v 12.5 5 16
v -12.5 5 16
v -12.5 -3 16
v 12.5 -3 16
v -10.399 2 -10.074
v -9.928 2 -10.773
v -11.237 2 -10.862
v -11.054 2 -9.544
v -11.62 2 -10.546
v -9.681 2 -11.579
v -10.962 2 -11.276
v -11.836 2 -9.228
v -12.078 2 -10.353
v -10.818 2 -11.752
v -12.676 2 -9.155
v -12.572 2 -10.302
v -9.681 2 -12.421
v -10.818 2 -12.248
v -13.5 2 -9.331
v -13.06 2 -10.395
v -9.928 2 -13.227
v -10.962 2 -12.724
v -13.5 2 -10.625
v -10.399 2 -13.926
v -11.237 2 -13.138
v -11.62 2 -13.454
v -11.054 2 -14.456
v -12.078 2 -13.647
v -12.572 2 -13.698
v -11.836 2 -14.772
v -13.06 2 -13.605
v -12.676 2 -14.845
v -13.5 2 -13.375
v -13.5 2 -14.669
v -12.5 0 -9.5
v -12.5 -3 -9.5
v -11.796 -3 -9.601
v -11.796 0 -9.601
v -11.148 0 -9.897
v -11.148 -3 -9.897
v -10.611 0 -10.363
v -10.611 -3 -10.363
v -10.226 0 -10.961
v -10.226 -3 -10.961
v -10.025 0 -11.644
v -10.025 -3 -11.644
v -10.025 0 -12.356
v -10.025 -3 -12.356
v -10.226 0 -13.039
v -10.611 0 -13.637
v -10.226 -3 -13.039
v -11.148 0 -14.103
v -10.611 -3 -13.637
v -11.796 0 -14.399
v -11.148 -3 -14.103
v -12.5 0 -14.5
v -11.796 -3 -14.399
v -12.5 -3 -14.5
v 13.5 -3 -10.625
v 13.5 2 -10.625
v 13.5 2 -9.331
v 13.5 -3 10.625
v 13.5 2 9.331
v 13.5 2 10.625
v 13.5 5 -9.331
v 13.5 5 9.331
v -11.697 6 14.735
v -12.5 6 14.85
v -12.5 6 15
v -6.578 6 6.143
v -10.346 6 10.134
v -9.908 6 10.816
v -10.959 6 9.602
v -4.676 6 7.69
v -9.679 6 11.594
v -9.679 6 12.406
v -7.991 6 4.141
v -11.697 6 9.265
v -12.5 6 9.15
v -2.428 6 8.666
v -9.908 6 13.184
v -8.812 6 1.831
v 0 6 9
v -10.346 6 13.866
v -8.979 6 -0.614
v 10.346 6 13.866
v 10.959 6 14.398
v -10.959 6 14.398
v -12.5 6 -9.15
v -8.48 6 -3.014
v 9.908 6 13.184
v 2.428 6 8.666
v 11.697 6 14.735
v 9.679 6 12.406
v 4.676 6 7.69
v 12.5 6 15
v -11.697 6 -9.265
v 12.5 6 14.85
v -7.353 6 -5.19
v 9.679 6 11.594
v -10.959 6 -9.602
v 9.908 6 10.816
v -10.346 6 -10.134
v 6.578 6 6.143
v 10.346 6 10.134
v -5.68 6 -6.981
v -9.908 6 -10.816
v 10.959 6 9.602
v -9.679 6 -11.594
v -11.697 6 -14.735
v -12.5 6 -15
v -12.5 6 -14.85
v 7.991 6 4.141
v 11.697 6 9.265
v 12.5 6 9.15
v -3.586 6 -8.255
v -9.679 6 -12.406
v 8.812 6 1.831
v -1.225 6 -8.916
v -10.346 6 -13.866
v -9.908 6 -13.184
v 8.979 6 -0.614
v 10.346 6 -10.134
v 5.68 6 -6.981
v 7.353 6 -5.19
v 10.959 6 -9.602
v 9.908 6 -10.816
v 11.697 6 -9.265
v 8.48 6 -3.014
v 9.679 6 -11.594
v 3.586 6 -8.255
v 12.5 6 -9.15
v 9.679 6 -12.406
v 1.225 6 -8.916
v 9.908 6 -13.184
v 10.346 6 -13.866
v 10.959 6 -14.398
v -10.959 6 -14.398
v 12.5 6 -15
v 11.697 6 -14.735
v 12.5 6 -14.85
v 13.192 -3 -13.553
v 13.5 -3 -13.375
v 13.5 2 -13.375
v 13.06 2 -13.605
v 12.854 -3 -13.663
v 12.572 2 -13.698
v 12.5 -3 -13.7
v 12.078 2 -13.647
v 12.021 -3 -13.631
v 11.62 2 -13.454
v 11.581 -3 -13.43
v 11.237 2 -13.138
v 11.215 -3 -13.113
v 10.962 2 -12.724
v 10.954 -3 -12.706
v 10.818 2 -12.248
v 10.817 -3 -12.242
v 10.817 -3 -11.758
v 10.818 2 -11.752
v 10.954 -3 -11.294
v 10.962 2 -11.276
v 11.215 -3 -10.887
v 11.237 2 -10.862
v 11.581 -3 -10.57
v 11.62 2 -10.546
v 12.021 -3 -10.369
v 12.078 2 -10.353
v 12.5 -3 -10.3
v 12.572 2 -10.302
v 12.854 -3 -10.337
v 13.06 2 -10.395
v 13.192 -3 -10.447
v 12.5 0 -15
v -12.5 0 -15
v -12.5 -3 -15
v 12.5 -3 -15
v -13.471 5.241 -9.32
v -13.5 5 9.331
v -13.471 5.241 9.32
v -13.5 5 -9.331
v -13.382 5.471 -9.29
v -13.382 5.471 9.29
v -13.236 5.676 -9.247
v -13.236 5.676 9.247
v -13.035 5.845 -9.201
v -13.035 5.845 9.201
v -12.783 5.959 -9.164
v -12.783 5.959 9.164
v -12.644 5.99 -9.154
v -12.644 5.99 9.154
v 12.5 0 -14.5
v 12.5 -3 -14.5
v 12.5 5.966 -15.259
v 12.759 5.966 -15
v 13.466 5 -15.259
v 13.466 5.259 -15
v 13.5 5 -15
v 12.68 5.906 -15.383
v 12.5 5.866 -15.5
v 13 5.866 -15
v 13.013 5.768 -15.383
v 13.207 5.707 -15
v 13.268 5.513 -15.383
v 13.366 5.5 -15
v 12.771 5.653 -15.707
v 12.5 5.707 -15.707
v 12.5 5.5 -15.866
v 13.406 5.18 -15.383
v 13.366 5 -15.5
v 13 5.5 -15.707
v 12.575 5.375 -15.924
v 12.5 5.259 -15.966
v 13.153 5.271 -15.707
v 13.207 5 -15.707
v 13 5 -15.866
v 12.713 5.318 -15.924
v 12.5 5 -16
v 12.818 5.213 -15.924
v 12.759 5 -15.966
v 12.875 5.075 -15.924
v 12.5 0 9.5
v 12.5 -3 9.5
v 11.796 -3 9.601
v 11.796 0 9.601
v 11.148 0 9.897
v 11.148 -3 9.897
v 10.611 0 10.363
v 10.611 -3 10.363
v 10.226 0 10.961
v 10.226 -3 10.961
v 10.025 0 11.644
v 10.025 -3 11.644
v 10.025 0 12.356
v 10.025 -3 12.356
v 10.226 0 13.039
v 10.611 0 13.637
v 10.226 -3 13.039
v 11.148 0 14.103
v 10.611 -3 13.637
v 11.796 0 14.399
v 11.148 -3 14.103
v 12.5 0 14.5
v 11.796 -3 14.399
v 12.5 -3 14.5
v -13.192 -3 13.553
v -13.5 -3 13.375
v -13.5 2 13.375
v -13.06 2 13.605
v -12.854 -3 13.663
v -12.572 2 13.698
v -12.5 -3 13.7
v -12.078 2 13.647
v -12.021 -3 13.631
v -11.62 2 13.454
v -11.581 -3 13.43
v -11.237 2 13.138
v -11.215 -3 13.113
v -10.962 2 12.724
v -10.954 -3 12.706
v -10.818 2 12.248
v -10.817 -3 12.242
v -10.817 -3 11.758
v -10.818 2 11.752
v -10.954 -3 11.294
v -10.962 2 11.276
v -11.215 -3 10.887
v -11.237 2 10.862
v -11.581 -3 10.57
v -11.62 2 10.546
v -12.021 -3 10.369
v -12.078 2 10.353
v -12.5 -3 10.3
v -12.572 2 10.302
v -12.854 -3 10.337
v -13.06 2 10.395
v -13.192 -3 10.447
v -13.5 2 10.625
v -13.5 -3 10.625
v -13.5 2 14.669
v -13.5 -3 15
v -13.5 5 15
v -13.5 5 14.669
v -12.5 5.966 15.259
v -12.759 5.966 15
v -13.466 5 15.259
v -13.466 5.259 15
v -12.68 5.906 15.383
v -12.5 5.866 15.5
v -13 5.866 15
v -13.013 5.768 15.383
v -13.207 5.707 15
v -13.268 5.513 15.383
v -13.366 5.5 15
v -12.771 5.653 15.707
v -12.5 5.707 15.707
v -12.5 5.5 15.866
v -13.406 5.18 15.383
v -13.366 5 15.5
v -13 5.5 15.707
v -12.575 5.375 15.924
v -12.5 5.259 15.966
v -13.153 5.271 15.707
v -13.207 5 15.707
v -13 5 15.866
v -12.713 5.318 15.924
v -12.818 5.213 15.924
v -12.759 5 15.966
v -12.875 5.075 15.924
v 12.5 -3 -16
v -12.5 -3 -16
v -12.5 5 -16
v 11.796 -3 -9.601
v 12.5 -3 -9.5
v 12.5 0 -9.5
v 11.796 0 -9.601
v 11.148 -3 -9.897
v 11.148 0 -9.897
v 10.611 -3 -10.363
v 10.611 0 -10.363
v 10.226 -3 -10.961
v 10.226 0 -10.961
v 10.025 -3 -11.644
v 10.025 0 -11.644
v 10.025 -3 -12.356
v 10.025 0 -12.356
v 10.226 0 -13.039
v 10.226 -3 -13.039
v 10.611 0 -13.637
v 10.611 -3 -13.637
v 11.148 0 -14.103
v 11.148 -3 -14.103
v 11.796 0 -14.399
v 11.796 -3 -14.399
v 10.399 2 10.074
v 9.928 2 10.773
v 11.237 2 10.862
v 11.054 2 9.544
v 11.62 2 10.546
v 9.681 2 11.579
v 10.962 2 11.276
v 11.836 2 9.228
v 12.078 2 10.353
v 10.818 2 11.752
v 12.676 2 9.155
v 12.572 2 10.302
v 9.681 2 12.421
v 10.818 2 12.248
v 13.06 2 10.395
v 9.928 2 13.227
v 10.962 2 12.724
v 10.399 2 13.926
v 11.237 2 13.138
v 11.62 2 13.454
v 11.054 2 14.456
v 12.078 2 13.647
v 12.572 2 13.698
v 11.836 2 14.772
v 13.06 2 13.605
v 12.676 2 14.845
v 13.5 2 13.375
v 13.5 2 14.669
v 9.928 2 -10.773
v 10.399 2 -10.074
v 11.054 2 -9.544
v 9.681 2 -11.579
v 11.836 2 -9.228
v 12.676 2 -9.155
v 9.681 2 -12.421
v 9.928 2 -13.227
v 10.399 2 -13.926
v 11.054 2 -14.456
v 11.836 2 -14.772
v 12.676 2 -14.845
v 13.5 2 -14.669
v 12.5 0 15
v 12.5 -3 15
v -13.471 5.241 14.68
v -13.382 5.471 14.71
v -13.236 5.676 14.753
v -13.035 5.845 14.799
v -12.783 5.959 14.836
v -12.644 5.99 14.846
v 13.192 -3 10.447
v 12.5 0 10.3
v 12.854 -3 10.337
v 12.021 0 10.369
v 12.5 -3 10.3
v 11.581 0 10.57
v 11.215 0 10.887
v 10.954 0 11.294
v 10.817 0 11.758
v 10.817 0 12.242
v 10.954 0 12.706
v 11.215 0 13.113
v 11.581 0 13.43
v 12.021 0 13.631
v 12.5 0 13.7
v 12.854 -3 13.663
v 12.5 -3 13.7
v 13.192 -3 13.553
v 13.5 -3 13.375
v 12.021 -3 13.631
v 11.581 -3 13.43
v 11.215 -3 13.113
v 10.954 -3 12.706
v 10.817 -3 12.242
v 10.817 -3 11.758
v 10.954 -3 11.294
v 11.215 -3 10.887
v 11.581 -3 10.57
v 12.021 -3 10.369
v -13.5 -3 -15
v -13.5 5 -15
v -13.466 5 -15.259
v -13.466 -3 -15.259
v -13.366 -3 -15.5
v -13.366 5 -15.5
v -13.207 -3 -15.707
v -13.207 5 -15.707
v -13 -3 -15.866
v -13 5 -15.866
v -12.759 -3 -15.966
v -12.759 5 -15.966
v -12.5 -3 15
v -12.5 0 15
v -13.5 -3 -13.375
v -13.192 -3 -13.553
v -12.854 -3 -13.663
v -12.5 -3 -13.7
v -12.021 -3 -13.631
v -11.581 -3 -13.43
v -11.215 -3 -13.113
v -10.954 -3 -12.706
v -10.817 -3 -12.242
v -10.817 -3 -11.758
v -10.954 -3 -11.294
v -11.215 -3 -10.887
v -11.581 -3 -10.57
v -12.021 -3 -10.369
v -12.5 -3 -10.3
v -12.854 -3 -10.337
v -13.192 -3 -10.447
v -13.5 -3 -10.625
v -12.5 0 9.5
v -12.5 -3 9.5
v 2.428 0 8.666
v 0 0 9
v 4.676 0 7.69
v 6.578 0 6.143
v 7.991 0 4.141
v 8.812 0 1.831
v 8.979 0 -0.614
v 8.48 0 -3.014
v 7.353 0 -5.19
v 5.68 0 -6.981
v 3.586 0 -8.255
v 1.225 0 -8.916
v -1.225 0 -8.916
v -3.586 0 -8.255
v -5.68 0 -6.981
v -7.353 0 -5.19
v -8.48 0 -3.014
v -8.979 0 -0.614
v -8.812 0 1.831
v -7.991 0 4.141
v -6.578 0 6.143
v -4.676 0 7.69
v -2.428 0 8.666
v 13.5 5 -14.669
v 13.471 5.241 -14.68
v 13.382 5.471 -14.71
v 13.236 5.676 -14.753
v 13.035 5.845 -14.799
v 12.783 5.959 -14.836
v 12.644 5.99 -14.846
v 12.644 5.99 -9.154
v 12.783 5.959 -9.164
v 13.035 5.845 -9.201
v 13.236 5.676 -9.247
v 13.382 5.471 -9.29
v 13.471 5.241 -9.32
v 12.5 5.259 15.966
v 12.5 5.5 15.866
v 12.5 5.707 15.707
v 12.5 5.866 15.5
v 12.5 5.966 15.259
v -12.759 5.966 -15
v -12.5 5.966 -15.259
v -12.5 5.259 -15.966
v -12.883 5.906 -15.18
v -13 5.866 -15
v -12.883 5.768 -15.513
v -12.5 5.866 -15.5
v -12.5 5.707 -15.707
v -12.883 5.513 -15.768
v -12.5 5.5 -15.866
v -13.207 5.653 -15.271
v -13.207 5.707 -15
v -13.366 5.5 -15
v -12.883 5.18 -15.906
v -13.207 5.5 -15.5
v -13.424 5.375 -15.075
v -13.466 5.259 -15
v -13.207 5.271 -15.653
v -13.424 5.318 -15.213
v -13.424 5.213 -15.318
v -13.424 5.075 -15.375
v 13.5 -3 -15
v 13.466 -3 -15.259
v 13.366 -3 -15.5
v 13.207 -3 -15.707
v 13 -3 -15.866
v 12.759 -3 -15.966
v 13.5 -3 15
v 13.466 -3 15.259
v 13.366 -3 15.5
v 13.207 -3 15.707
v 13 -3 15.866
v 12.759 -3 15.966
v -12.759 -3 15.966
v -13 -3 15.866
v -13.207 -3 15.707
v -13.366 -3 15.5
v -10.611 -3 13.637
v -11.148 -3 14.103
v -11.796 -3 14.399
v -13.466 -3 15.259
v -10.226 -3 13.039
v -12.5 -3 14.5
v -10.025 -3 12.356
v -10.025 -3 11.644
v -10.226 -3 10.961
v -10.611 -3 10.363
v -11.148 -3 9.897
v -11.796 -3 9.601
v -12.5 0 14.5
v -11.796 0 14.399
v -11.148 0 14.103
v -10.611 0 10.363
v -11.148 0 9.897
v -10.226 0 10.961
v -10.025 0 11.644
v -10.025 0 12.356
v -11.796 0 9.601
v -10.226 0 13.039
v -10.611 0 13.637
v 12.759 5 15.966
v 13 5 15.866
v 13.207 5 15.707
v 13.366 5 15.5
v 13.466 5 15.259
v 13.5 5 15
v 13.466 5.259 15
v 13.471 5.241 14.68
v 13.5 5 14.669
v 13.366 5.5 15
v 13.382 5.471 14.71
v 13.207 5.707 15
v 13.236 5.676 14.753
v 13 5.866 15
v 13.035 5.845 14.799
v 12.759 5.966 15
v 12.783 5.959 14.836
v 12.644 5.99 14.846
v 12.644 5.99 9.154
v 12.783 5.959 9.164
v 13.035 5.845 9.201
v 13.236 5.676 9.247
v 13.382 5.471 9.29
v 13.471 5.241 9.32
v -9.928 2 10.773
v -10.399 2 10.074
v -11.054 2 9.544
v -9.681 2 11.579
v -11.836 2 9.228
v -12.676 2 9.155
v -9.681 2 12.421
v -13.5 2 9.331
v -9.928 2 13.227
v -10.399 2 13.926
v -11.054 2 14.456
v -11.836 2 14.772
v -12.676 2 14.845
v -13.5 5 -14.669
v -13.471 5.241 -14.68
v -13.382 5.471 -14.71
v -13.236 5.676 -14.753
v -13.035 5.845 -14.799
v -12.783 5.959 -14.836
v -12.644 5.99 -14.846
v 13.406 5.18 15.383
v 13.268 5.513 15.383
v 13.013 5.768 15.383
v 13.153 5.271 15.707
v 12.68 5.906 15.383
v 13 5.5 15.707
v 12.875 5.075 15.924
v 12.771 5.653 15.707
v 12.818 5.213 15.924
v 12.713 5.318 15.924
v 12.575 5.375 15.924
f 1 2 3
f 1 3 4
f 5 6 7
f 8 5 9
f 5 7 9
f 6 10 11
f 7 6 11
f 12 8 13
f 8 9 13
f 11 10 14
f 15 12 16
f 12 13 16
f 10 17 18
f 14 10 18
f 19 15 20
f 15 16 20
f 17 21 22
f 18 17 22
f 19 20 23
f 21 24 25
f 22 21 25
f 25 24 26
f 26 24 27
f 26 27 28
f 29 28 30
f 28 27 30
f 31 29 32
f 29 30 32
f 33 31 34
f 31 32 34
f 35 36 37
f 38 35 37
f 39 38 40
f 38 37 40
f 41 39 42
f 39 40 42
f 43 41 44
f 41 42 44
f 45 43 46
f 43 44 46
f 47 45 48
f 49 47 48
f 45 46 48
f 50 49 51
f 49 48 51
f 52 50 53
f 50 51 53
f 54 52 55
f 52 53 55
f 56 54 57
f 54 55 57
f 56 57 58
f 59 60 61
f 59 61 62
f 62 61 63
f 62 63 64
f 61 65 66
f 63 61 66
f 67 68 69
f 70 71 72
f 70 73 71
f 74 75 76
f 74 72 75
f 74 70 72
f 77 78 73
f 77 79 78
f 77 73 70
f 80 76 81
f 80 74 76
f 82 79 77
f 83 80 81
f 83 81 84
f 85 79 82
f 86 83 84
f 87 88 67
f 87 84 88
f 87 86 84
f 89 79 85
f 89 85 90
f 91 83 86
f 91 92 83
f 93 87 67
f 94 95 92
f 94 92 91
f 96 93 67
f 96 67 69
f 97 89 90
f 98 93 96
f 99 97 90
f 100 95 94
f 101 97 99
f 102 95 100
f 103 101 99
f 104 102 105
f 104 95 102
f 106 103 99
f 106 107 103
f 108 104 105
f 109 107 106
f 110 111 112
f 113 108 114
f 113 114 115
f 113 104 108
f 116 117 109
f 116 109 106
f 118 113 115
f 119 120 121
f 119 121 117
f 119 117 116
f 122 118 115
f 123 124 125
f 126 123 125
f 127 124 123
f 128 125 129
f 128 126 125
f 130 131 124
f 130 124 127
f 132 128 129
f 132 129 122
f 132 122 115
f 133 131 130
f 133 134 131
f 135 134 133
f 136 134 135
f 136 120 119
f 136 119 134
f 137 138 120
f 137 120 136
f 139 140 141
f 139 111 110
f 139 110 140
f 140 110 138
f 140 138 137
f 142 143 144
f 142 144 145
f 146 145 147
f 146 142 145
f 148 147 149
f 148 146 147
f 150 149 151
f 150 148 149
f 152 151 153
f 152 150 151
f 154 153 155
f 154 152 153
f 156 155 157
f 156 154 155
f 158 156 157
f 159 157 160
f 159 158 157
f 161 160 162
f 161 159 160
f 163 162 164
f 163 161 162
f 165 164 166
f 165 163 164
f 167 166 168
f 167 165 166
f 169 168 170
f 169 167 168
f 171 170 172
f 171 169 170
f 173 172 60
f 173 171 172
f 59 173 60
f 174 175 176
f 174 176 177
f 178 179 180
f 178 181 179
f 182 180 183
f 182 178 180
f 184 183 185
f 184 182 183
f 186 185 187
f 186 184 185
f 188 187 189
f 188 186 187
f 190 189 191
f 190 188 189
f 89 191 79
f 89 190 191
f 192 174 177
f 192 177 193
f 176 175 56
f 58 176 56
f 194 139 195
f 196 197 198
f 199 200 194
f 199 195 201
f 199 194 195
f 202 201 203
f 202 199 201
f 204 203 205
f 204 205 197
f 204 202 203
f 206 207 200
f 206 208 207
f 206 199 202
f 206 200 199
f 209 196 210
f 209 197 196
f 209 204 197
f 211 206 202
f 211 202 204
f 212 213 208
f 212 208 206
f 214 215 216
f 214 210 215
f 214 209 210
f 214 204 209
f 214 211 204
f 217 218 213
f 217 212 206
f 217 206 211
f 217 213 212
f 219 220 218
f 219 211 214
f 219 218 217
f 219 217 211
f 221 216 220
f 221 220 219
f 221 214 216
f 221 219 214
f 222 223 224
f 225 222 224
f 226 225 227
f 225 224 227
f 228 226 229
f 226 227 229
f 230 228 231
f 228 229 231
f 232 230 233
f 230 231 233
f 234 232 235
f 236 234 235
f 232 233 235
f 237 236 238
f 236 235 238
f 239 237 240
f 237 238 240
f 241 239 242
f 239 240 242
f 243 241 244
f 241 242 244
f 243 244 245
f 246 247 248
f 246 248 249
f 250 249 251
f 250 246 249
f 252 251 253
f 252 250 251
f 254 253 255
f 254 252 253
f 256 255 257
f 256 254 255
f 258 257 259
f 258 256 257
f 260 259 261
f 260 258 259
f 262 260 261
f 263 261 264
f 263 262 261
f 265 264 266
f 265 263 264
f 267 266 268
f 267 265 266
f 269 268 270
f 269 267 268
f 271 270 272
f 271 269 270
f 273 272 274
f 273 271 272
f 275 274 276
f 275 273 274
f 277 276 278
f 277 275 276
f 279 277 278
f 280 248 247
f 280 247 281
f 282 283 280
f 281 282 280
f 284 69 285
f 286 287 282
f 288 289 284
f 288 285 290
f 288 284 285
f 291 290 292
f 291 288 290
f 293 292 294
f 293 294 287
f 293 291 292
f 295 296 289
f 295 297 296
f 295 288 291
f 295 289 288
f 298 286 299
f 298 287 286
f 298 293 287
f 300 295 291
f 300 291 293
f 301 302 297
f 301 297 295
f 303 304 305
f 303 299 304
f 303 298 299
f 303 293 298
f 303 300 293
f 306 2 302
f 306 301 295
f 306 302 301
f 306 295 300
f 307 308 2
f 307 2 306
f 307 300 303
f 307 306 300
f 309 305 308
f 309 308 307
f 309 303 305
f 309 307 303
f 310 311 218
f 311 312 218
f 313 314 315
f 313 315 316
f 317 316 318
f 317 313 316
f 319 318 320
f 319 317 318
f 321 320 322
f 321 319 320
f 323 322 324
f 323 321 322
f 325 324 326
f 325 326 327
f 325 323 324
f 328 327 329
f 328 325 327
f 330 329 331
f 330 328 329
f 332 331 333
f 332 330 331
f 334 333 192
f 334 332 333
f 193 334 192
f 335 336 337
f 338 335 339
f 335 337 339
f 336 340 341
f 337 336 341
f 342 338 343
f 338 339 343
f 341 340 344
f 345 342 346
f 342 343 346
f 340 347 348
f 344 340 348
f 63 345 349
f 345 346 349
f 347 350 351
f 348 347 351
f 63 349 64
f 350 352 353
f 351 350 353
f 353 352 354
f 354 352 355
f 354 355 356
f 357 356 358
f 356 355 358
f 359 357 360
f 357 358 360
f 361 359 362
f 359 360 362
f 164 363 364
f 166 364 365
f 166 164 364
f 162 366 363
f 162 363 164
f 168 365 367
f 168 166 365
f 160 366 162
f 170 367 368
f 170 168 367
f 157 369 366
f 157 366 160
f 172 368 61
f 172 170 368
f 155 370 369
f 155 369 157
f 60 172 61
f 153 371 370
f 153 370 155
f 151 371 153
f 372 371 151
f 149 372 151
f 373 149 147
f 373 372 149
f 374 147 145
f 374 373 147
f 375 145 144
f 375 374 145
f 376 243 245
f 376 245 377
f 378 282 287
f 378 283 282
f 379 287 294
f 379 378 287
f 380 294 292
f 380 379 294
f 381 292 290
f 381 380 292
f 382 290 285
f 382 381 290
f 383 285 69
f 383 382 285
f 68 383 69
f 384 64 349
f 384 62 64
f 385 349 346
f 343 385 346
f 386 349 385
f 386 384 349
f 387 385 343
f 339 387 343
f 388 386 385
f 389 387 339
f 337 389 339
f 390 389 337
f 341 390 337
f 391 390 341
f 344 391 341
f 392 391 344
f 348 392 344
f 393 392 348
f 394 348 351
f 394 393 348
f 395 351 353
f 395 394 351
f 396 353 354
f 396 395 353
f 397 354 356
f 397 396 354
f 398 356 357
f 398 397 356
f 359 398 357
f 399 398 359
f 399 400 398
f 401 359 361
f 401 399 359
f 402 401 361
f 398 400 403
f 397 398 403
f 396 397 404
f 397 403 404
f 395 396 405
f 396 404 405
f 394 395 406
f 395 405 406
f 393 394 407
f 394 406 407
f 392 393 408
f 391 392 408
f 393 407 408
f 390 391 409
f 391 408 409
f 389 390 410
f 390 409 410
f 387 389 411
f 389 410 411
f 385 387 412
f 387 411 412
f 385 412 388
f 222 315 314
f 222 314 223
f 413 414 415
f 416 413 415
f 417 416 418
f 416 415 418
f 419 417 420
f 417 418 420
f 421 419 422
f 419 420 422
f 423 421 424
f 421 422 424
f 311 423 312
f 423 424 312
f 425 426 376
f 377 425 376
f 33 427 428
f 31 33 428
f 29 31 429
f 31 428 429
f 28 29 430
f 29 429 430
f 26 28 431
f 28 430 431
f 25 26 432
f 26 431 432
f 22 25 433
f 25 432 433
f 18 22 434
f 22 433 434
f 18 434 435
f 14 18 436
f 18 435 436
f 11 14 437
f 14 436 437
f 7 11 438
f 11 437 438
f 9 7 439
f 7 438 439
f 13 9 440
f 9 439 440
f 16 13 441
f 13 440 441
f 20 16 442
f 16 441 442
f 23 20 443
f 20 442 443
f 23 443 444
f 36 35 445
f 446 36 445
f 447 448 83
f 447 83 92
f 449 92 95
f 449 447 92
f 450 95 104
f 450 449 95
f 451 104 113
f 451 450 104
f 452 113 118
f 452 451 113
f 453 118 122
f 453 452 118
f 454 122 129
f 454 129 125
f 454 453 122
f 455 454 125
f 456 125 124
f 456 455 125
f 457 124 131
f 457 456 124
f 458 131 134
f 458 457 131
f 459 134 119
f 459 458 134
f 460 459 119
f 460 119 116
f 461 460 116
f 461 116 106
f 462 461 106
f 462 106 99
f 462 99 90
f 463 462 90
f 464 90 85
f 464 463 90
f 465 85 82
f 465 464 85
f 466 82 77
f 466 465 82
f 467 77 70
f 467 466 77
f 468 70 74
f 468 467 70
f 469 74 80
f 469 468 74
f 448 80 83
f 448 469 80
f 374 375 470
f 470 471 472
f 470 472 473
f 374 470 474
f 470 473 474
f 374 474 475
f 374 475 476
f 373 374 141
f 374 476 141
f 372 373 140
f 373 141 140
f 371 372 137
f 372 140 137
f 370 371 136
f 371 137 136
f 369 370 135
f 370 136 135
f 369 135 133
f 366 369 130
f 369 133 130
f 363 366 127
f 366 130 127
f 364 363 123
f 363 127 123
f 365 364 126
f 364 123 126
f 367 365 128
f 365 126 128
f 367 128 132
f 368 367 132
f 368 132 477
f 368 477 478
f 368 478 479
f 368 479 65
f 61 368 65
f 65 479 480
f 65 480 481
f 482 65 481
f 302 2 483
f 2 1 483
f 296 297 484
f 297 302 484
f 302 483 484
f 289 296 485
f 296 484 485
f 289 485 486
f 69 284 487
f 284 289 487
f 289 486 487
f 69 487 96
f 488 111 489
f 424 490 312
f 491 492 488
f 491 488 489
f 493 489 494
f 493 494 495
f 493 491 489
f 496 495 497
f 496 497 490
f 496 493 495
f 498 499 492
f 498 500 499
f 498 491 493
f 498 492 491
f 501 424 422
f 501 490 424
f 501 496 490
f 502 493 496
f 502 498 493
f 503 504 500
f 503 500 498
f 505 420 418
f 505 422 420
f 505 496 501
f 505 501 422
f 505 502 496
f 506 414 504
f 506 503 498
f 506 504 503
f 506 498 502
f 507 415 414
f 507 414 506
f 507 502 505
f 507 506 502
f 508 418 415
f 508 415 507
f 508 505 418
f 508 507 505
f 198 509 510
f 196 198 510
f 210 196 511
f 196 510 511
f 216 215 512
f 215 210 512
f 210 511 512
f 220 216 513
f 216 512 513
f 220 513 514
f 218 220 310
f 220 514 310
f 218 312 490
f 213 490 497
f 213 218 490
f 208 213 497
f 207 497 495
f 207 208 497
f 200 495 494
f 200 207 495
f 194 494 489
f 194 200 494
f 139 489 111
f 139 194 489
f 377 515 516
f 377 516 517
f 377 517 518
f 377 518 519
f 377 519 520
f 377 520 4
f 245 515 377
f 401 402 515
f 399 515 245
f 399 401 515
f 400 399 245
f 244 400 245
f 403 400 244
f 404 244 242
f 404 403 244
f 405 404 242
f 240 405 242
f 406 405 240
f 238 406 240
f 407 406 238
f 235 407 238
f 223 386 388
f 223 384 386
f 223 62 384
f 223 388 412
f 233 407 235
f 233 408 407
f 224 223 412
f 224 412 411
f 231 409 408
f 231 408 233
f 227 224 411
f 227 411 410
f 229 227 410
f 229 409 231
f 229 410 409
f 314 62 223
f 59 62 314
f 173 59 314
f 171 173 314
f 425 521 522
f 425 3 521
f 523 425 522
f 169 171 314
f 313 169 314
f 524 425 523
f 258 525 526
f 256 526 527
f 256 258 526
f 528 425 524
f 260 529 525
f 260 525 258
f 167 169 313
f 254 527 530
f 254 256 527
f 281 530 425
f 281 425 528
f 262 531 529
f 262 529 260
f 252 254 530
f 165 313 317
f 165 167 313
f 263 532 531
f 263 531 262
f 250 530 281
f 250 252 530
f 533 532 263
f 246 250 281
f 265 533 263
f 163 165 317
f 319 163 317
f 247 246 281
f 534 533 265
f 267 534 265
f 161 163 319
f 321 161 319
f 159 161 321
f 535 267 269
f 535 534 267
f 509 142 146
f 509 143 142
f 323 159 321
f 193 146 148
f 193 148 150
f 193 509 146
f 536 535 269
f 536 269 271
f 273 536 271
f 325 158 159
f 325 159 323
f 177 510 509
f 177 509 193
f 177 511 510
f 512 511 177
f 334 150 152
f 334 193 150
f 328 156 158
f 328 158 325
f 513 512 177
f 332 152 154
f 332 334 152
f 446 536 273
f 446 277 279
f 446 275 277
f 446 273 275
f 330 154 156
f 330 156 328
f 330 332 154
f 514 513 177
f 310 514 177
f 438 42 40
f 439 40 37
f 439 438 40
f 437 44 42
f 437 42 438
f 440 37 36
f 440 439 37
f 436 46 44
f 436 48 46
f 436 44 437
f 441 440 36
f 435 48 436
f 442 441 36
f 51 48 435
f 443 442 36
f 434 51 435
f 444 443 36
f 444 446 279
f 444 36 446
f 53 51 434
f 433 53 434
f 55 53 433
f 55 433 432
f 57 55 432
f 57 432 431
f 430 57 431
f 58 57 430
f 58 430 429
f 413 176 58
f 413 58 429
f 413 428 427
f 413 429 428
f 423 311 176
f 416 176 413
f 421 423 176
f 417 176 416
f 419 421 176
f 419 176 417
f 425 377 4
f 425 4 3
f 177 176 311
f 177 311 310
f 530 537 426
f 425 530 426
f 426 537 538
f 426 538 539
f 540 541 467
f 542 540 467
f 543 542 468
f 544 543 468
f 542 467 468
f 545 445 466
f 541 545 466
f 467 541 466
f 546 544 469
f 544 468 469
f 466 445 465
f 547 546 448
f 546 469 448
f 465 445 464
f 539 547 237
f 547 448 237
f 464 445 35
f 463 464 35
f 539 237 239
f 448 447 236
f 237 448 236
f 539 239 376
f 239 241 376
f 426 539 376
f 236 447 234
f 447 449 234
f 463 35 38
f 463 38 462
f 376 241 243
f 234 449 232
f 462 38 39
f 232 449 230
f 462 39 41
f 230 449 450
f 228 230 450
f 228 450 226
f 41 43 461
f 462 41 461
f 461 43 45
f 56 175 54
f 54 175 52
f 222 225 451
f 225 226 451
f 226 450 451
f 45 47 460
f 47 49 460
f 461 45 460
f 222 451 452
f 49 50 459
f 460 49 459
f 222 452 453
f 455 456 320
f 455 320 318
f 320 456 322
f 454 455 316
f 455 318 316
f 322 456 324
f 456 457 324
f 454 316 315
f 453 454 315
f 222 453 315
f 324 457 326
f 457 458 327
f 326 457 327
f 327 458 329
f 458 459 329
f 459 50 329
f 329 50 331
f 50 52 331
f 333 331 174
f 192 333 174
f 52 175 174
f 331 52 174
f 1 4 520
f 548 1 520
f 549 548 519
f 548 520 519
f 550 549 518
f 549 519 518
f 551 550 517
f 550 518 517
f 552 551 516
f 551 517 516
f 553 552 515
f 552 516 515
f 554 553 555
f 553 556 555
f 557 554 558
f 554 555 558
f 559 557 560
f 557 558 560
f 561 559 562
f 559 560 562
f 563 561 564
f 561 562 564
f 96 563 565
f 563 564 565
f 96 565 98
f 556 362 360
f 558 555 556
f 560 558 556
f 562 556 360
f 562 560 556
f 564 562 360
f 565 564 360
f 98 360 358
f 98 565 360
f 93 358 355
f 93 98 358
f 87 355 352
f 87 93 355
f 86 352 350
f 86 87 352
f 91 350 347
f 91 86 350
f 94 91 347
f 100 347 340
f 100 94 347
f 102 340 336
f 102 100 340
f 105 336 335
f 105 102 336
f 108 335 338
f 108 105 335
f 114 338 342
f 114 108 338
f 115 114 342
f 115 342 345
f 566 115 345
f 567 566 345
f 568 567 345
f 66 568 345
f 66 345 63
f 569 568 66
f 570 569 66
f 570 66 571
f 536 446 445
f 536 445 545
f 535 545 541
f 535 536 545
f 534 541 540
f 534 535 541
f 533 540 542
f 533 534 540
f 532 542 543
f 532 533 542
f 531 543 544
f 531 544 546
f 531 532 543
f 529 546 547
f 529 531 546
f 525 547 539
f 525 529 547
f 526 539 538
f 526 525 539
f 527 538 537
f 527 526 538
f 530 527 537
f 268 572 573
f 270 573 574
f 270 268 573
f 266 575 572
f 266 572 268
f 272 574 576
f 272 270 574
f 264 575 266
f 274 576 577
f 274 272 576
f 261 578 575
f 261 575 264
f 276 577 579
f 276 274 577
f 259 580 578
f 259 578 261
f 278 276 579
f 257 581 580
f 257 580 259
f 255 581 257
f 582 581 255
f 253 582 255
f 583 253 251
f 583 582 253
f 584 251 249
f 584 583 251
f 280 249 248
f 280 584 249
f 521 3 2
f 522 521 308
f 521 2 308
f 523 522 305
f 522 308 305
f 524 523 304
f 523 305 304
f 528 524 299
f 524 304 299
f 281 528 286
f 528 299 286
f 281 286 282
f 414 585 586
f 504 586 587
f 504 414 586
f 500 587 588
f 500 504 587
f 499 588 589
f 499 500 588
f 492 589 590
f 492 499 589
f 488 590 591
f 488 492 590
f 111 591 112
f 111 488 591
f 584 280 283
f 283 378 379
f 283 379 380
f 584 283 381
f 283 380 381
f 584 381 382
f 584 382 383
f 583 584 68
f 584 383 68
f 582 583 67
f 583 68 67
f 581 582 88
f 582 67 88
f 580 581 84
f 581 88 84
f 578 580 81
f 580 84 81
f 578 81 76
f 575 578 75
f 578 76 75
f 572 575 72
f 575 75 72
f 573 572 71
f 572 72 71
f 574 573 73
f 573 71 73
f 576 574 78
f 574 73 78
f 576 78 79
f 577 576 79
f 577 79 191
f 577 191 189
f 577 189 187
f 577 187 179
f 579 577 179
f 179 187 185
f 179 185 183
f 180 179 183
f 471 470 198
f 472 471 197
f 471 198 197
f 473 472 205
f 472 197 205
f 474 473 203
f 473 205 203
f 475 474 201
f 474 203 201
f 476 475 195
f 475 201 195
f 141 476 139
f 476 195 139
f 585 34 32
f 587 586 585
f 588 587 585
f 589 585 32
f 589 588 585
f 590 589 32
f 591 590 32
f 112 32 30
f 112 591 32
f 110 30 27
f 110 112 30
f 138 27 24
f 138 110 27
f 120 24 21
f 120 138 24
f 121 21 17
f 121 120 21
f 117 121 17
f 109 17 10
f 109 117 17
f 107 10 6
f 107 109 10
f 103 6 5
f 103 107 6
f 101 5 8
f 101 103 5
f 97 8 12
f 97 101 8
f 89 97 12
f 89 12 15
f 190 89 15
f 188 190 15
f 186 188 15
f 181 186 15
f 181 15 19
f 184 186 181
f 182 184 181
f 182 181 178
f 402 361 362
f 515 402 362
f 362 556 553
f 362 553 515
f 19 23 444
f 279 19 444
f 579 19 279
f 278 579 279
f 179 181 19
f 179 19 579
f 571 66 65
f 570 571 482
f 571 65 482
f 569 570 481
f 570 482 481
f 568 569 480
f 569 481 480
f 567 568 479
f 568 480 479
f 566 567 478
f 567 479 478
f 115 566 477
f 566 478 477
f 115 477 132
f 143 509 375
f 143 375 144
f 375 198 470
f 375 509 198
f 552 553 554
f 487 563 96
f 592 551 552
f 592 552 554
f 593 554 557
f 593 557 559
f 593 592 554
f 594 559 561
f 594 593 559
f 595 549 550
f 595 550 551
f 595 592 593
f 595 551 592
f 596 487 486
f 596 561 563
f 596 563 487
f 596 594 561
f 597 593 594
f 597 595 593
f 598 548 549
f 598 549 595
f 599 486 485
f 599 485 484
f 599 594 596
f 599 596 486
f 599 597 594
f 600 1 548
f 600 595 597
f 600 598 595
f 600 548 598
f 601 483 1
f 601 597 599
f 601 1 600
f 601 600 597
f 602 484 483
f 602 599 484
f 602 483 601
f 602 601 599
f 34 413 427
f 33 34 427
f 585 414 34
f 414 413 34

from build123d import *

# Parameters (mm, degrees)
SKETCH2_W               = 27
SKETCH2_H               = 32
SKETCH2_R               = 9
BOSS_EXTRUDE1_DEPTH     = 6
SKETCH3_W               = 27
SKETCH3_H               = 32
SKETCH3_W_2             = 25
SKETCH3_H_2             = 30
BOSS_EXTRUDE2_DEPTH     = 3
CUT_EXTRUDE1_DEPTH      = 22.77728174
CUT_EXTRUDE1_DEPTH_BACK = 22.77728174
SKETCH1_R               = 1.7
BOSS_EXTRUDE4_REACH     = 24.787
MIRROR2_COPY_1_REACH    = 24.787
SKETCH6_R               = 2.85
CUT_EXTRUDE2_DEPTH      = 4
MIRROR4_COPY_1_SKETCH_R = 2.85
MIRROR4_COPY_1_DEPTH    = 4
FILLET1_R               = 1
FILLET4_R               = 1


with BuildPart() as part:
    # Sketch2 → Boss-Extrude1 (new body)
    with BuildSketch(Plane(origin=(0, 0, 0), x_dir=(1, 0, 0), z_dir=(0, 1, 0))):
        Rectangle(SKETCH2_W, SKETCH2_H)
        with Locations(Location((0, 0, 0), (0, 0, 270))):
            Circle(SKETCH2_R, mode=Mode.SUBTRACT)
    extrude(amount=BOSS_EXTRUDE1_DEPTH)

    # Sketch3 → Boss-Extrude2 (add)
    with BuildSketch(Plane.XZ):
        Rectangle(SKETCH3_W, SKETCH3_H)
        Rectangle(SKETCH3_W_2, SKETCH3_H_2, mode=Mode.SUBTRACT)
    extrude(amount=BOSS_EXTRUDE2_DEPTH)

    # Sketch1 → Cut-Extrude1 (cut, two sides: drawn at the far end of the back side and taken through both)
    with BuildSketch(Plane(origin=(0, 0, 0), x_dir=(1, 0, 0), z_dir=(0, 1, 0)).offset(-CUT_EXTRUDE1_DEPTH_BACK)):
        with Locations((-12.5, 12)):
            Circle(SKETCH1_R)
        with Locations((12.5, 12)):
            Circle(SKETCH1_R)
        with Locations((-12.5, -12)):
            Circle(SKETCH1_R)
        with Locations((12.5, -12)):
            Circle(SKETCH1_R)
    extrude(amount=CUT_EXTRUDE1_DEPTH + CUT_EXTRUDE1_DEPTH_BACK, mode=Mode.SUBTRACT)

    # Sketch5 → Boss-Extrude4 (add, up to next)
    with BuildSketch(Plane.XZ.offset(3), mode=Mode.PRIVATE) as boss_extrude4_sk1:
        with BuildLine():
            Line((13.5, -10.625227292), (13.5, -9.708712153))
            ThreePointArc((13.5, -9.708712153), (10, -12), (13.5, -14.291287847))
            Line((13.5, -14.291287847), (13.5, -13.374772708))
            ThreePointArc((13.5, -13.374772708), (10.8, -12), (13.5, -10.625227292))
        make_face()
    boss_extrude4_tool1 = extrude(boss_extrude4_sk1.sketch, amount=-BOSS_EXTRUDE4_REACH, mode=Mode.PRIVATE) - part.part
    boss_extrude4 = boss_extrude4_tool1.solids().sort_by_distance((13.438967, -3, -10.16697))[0]
    add(boss_extrude4)

    # Mirror1: Boss-Extrude4 across plane
    add(boss_extrude4.mirror(Plane(origin=(0, 0, 0), x_dir=(0, 0, 1), z_dir=(1, 0, 0))))

    # Mirror2: Boss-Extrude4 across plane
    add(boss_extrude4.mirror(Plane.XY))

    # Mirror2 copy 1 sketch → Mirror2 copy 1 (add, up to next)
    with BuildSketch(Plane(origin=(0, -3, 0), x_dir=(-1, 0, 0), z_dir=(0, -1, 0)), mode=Mode.PRIVATE) as mirror2_copy_1_sk1:
        with BuildLine():
            Line((13.5, -10.625227292), (13.5, -9.708712153))
            ThreePointArc((13.5, -9.708712153), (10, -12), (13.5, -14.291287847))
            Line((13.5, -14.291287847), (13.5, -13.374772708))
            ThreePointArc((13.5, -13.374772708), (10.8, -12), (13.5, -10.625227292))
        make_face()
    mirror2_copy_1_tool1 = extrude(mirror2_copy_1_sk1.sketch, amount=-MIRROR2_COPY_1_REACH, mode=Mode.PRIVATE) - part.part
    add(mirror2_copy_1_tool1.solids().sort_by_distance((-13.438967, -3, 10.16697))[0])

    # Sketch6 → Cut-Extrude2 (cut)
    with BuildSketch(Plane(origin=(0, 6, 0), x_dir=(1, 0, 0), z_dir=(0, 1, 0))):
        with Locations((12.5, 12)):
            Circle(SKETCH6_R)
    cut_extrude2 = extrude(amount=-CUT_EXTRUDE2_DEPTH, mode=Mode.SUBTRACT)

    # Mirror3: Cut-Extrude2 across plane
    add(cut_extrude2.mirror(Plane(origin=(0, 0, 0), x_dir=(0, 0, 1), z_dir=(1, 0, 0))), mode=Mode.SUBTRACT)

    # Mirror4: Cut-Extrude2 across plane
    add(cut_extrude2.mirror(Plane.XY), mode=Mode.SUBTRACT)

    # Mirror4 copy 1 sketch → Mirror4 copy 1 (cut)
    with BuildSketch(Plane(origin=(0, 6, 0), x_dir=(-1, 0, 0), z_dir=(0, 1, 0))):
        with Locations((12.5, 12)):
            Circle(MIRROR4_COPY_1_SKETCH_R)
    extrude(amount=-MIRROR4_COPY_1_DEPTH, mode=Mode.SUBTRACT)

    # Fillet1
    fillet1_edges = [part.edges().sort_by_distance(p)[0] for p in [
        (-13.5, 6, -15.334400615),
        (13.5, 6, -15.334400615),
        (0, 6, 16),
        (-13.5, 6, 0),
        (13.5, 6, 0),
        (-13.5, 6, 15.334400615),
        (13.5, 6, 15.334400615),
        (0, 6, -16),
    ]]
    fillet(fillet1_edges, radius=FILLET1_R)

    # Fillet4
    # the kernel refuses this fillet: 1 mm, written as the material it takes off along each edge
    with BuildSketch(Plane(origin=(-12.5, 5, -15), x_dir=(0, 0, -1), z_dir=(-1, 0, 0))) as fillet4_piece_1_section:
        Polygon((0, 0), (FILLET4_R, 0), (FILLET4_R, -FILLET4_R), (0, -FILLET4_R), align=None)
    fillet4_piece_1 = extrude(amount=FILLET4_R, mode=Mode.PRIVATE)
    fillet4_piece_1 = fillet4_piece_1 - Plane(origin=(-12.5, 5, -15), x_dir=(0, -0.7071067811865475, 0.7071067811865475), z_dir=(-1, 0, 0)) * Sphere(FILLET4_R, mode=Mode.PRIVATE)
    add(fillet4_piece_1, mode=Mode.SUBTRACT)
    with BuildSketch(Plane(origin=(12.5, 5, -15), x_dir=(1, 0, 0), z_dir=(0, 0, -1))) as fillet4_piece_2_section:
        Polygon((0, 0), (FILLET4_R, 0), (FILLET4_R, -FILLET4_R), (0, -FILLET4_R), align=None)
    fillet4_piece_2 = extrude(amount=FILLET4_R, mode=Mode.PRIVATE)
    fillet4_piece_2 = fillet4_piece_2 - Plane(origin=(12.5, 5, -15), x_dir=(-0.7071067811865475, -0.7071067811865475, 0), z_dir=(0, 0, -1)) * Sphere(FILLET4_R, mode=Mode.PRIVATE)
    add(fillet4_piece_2, mode=Mode.SUBTRACT)
    with BuildSketch(Plane(origin=(-12.5, 5, 15), x_dir=(-1, 0, 0), z_dir=(0, 0, 1))) as fillet4_piece_3_section:
        Polygon((0, 0), (FILLET4_R, 0), (FILLET4_R, -FILLET4_R), (0, -FILLET4_R), align=None)
    fillet4_piece_3 = extrude(amount=FILLET4_R, mode=Mode.PRIVATE)
    fillet4_piece_3 = fillet4_piece_3 - Plane(origin=(-12.5, 5, 15), x_dir=(0.7071067811865475, -0.7071067811865475, 0), z_dir=(0, 0, 1)) * Sphere(FILLET4_R, mode=Mode.PRIVATE)
    add(fillet4_piece_3, mode=Mode.SUBTRACT)
    with BuildSketch(Plane(origin=(12.5, 5, 15), x_dir=(1, 0, 0), z_dir=(0, 0, 1))) as fillet4_piece_4_section:
        Polygon((0, 0), (FILLET4_R, 0), (FILLET4_R, FILLET4_R), (0, FILLET4_R), align=None)
    fillet4_piece_4 = extrude(amount=FILLET4_R, mode=Mode.PRIVATE)
    fillet4_piece_4 = fillet4_piece_4 - Plane(origin=(12.5, 5, 15), x_dir=(-0.7071067811865475, -0.7071067811865475, 0), z_dir=(0, 0, 1)) * Sphere(FILLET4_R, mode=Mode.PRIVATE)
    add(fillet4_piece_4, mode=Mode.SUBTRACT)
    with BuildSketch(Plane(origin=(13.5, -5.5, -16), x_dir=(-1, 0, 0), z_dir=(0, 1, 0))) as fillet4_piece_5:
        with BuildLine():
            CenterArc((FILLET4_R, FILLET4_R), FILLET4_R, 180, 90)
            Line((0, FILLET4_R), (0, 0))
            Line((0, 0), (FILLET4_R, 0))
        make_face()
    extrude(amount=10.5, mode=Mode.SUBTRACT)
    with BuildSketch(Plane(origin=(13.5, -5.5, 16), x_dir=(-1, 0, 0), z_dir=(0, 1, 0)), Plane(origin=(-13.5, 5, 16), x_dir=(1, 0, 0), z_dir=(0, -1, 0)), Plane(origin=(-13.5, 5, -16), x_dir=(0, 0, 1), z_dir=(0, -1, 0))) as fillet4_piece_6:
        with BuildLine():
            CenterArc((FILLET4_R, -FILLET4_R), FILLET4_R, 90, 90)
            Line((0, -FILLET4_R), (0, 0))
            Line((0, 0), (FILLET4_R, 0))
        make_face()
    extrude(amount=10.5, mode=Mode.SUBTRACT)


solid = part.part
